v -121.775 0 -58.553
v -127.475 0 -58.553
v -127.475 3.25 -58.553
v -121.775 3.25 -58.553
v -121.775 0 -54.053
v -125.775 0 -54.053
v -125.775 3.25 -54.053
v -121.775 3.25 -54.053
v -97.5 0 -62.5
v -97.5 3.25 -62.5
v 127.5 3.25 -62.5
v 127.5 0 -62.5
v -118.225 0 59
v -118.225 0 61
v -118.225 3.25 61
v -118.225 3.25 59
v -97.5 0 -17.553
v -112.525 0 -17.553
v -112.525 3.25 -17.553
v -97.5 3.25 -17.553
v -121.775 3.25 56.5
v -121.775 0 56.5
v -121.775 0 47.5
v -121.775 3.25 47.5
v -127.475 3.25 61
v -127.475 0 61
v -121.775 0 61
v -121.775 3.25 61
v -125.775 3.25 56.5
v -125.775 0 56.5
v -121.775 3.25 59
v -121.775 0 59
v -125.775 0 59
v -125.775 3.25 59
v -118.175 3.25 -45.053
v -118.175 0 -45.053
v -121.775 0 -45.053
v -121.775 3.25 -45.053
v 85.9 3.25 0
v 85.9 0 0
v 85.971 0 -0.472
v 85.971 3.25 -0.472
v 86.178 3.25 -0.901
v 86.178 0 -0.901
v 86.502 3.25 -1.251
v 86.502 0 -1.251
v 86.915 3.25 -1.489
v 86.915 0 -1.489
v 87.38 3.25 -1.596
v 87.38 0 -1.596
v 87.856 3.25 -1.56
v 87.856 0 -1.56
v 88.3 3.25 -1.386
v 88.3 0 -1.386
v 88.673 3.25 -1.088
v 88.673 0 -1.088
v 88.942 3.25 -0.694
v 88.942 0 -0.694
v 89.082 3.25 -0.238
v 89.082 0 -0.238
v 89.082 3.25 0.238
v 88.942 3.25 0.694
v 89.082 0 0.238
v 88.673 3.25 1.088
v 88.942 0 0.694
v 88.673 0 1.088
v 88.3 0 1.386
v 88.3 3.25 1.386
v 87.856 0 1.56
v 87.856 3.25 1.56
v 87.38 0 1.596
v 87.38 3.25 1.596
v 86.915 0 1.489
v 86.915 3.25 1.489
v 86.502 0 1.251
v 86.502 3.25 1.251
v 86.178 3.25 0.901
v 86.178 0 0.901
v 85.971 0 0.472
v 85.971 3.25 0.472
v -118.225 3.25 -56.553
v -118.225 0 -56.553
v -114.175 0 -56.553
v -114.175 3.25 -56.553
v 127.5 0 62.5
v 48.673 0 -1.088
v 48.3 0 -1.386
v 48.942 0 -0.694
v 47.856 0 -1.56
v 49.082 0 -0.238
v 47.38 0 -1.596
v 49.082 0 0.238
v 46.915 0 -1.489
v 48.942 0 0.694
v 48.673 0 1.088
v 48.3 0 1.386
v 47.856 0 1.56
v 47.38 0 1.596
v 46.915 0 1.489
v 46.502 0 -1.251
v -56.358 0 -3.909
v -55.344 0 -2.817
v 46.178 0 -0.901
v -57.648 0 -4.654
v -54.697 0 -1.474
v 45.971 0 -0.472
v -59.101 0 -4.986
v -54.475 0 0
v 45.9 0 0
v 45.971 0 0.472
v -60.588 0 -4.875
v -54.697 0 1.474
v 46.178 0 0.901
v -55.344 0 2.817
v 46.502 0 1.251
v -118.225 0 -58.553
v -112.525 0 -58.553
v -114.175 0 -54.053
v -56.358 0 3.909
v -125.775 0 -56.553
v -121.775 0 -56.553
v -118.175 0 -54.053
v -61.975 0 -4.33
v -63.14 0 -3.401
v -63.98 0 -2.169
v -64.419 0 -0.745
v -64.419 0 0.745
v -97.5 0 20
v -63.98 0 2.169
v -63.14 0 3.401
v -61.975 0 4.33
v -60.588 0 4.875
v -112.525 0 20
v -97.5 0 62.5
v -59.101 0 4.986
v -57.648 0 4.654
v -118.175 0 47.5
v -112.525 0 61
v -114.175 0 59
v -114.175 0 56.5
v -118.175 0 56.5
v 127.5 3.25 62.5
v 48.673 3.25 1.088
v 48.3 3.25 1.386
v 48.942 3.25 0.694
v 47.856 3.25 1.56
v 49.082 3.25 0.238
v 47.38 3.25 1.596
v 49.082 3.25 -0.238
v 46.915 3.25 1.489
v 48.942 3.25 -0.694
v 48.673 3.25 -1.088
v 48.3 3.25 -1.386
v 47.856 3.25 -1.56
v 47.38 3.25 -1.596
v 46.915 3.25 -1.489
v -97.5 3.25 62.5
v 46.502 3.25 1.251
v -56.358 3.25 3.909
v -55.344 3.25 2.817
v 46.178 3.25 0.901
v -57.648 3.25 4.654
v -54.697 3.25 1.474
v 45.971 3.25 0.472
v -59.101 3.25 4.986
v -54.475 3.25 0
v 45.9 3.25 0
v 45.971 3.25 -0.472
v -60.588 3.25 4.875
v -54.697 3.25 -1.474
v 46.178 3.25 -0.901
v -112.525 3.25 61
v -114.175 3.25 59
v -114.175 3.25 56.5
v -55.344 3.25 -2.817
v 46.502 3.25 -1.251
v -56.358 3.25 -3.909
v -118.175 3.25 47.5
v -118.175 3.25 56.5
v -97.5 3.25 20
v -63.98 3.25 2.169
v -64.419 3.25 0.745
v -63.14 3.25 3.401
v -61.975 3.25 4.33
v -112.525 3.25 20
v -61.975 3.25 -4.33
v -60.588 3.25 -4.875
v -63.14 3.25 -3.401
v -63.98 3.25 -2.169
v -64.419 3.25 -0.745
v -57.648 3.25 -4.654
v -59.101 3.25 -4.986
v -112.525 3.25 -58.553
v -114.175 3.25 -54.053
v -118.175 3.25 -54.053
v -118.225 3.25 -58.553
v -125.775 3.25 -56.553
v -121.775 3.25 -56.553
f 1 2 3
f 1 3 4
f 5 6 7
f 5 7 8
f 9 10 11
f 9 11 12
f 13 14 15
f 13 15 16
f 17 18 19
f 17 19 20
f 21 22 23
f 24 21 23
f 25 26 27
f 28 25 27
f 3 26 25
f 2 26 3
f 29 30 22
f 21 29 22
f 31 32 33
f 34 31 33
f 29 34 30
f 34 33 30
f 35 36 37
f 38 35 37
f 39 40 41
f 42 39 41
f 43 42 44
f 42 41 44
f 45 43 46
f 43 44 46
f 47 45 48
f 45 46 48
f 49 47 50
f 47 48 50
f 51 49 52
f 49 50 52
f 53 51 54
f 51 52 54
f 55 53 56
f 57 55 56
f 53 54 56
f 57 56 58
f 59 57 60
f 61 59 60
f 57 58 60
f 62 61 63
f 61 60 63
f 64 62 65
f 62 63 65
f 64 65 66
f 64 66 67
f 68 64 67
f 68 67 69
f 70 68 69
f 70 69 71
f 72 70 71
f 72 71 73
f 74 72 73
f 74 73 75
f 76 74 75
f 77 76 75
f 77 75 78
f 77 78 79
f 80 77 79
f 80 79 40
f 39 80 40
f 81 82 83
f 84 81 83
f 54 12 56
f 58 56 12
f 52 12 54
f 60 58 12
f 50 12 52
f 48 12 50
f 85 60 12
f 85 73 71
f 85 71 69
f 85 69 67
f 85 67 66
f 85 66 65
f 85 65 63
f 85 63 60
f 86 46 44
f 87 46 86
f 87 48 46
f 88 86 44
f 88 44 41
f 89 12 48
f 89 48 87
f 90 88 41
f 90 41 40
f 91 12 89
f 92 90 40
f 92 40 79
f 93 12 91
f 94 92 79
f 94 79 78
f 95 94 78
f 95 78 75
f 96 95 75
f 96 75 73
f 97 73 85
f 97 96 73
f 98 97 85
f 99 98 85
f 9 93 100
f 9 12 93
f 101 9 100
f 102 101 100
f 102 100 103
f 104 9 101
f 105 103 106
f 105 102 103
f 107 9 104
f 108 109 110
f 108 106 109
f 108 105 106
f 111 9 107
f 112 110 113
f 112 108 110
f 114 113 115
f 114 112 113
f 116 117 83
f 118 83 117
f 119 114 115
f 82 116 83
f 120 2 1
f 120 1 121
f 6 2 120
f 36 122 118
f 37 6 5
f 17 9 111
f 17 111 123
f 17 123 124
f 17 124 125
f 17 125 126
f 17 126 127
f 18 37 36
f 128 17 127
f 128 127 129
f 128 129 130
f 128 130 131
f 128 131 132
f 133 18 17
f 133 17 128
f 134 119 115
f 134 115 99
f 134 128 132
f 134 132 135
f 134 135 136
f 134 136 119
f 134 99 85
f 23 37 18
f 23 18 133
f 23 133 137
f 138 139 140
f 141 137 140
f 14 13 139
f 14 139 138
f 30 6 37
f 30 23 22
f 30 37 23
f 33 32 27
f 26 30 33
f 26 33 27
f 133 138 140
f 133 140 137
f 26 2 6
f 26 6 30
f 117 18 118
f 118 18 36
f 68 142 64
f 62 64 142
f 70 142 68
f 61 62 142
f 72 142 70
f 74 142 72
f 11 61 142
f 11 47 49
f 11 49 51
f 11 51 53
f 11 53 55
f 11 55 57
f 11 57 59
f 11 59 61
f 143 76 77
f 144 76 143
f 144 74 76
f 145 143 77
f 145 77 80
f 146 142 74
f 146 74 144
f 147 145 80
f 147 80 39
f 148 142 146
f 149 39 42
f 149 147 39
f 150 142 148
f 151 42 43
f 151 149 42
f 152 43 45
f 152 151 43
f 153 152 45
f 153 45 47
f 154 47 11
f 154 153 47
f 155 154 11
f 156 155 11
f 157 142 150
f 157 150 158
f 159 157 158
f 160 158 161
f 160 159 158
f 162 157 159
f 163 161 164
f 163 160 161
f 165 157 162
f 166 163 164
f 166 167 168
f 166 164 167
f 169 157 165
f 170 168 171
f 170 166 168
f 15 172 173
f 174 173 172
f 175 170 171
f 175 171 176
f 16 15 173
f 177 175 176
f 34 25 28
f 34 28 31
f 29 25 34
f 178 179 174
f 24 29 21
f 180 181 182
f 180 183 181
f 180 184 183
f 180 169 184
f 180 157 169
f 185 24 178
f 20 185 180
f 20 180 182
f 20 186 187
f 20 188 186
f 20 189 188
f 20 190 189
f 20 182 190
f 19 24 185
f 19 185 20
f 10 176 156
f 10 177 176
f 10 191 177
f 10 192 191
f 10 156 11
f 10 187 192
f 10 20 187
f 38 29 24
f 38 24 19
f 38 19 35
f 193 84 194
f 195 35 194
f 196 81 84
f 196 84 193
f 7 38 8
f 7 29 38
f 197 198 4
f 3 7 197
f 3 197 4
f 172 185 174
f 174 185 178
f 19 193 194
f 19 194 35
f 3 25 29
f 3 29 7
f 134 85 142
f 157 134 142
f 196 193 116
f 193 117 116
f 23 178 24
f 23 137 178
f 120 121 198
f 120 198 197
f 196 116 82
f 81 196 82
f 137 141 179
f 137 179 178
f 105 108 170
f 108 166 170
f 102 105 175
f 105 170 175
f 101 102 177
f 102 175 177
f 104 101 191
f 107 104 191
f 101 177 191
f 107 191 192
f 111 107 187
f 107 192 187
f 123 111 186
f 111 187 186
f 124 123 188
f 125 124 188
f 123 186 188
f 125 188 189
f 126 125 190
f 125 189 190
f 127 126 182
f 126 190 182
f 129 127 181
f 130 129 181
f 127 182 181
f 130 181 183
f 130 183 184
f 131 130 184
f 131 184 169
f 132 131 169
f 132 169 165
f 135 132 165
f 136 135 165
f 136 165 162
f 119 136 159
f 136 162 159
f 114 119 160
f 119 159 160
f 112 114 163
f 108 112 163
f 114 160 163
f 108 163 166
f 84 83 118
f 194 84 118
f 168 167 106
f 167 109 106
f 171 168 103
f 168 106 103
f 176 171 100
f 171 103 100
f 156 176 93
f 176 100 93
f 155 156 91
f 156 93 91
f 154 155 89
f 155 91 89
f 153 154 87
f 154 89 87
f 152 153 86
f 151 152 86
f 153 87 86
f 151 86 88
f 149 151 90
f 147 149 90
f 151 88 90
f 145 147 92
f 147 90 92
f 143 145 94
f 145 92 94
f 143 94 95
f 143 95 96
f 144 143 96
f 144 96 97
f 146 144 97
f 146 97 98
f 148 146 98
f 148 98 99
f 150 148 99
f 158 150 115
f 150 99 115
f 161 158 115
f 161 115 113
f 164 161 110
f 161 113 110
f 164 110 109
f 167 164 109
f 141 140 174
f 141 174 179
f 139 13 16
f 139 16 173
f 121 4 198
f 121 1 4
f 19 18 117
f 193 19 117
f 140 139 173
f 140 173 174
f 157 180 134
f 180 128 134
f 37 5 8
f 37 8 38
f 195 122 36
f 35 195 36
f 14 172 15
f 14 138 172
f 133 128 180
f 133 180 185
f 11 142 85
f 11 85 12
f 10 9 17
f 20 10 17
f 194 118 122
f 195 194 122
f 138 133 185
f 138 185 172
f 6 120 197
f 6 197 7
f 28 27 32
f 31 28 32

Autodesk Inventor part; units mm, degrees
ref_plane "YZ Plane" through (0, 0, 0) normal (1, 0, 0) x (0, 1, 0)
ref_plane "XZ Plane" through (0, 0, 0) normal (0, 1, 0) x (-1, 0, 0)
ref_plane "XY Plane" through (0, 0, 0) normal (0, 0, 1) x (1, 0, 0)
sketch "Sketch1" plane through (0, 0, 0) normal (0, 1, 0) x (-1, 0, 0)
  line L0 (-97.5, -62.5) -> (97.5, -62.5)
  line L1 (97.5, 62.5) -> (-97.5, 62.5)
  line L2 (-97.5, 62.5) -> (-97.5, -62.5)
  line L3 (-97.5, -62.5) -> (97.5, 62.5) construction
  line L4 (97.5, -62.5) -> (-97.5, 62.5) construction
  line L5 (97.5, 20) -> (112.525, 20)
  line L6 (127.475, 21.2237) -> (127.475, -18.7763)
  line L7 (112.525, -17.5526) -> (97.5, -17.5526)
  line L8 (97.5, -62.5) -> (97.5, -17.5526)
  line L9 (97.5, 20) -> (97.5, 62.5)
  line L10 (112.525, 20) -> (112.525, 61)
  line L11 (127.475, 61) -> (127.475, 21.2237)
  line L12 (127.475, 1.2237) -> (97.475, 1.2237) construction
  line L13 (112.525, -17.5526) -> (112.525, -58.5526)
  line L14 (127.475, -58.5526) -> (127.475, -18.7763)
  line L15 (119.975, 61) -> (121.775, 61) construction
  line L16 (121.775, 61) -> (121.775, 59)
  line L17 (118.225, 61) -> (118.225, 59)
  line L18 (121.775, 59) -> (125.775, 59)
  line L19 (125.775, 59) -> (125.775, 56.5)
  line L20 (125.775, 56.5) -> (121.775, 56.5)
  line L21 (121.775, 61) -> (121.775, 53) construction
  line L22 (119.975, 61) -> (119.975, 52.3078) construction
  line L23 (118.225, 59) -> (114.175, 59)
  line L24 (114.175, 59) -> (114.175, 56.5)
  line L25 (114.175, 56.5) -> (118.175, 56.5)
  line L26 (118.175, 56.5) -> (118.175, 53.5)
  line L27 (112.525, 61) -> (118.225, 61)
  line L28 (127.475, 61) -> (121.775, 61)
  line L29 (119.975, -58.5526) -> (121.775, -58.5526) construction
  line L30 (112.525, -58.5526) -> (118.225, -58.5526)
  line L31 (127.475, -58.5526) -> (121.775, -58.5526)
  line L32 (121.775, 56.5) -> (121.775, 47.5)
  line L33 (118.175, 53.5) -> (118.175, 47.5)
  line L34 (118.175, 47.5) -> (121.775, 47.5)
  line L35 (119.975, -58.5526) -> (121.775, -58.5526) construction
  line L36 (121.775, -58.5526) -> (121.775, -56.5526)
  line L37 (118.225, -58.5526) -> (118.225, -56.5526)
  line L38 (121.775, -56.5526) -> (125.775, -56.5526)
  line L39 (125.775, -56.5526) -> (125.775, -54.0526)
  line L40 (125.775, -54.0526) -> (121.775, -54.0526)
  line L41 (121.775, -58.5526) -> (121.775, -50.5526) construction
  line L42 (119.975, -58.5526) -> (119.975, -49.8604) construction
  line L43 (114.175, -54.0526) -> (118.175, -54.0526)
  line L44 (114.175, -56.5526) -> (114.175, -54.0526)
  line L45 (118.225, -56.5526) -> (114.175, -56.5526)
  line L46 (118.175, -54.0526) -> (118.175, -51.0526)
  line L47 (112.525, -58.5526) -> (118.225, -58.5526)
  line L48 (127.475, -58.5526) -> (121.775, -58.5526)
  line L49 (121.775, -54.0526) -> (121.775, -45.0526)
  line L50 (118.175, -51.0526) -> (118.175, -45.0526)
  line L51 (118.175, -45.0526) -> (121.775, -45.0526)
  line L52 (127.475, 61) -> (127.475, 79) construction
  line L53 (-97.5, 0) -> (-67.5, 0) construction
  line L54 (-67.5, 62.5) -> (-67.5, -62.5) construction
  line L55 (127.475, 79) -> (-67.5, 0) construction
  line L56 (127.475, -58.5526) -> (127.475, -76.5526) construction
  line L57 (127.475, -76.5526) -> (-67.5, 0) construction
  line L58 (-97.5, 62.5) -> (-117.5, 62.5)
  line L59 (-117.5, 62.5) -> (-117.5, -62.5)
  line L60 (-117.5, -62.5) -> (-97.5, -62.5)
  line L61 (-97.5, -62.5) -> (-97.5, 62.5)
  line L62 (-67.5, 0) -> (-47.5, 0) construction
  circle A0 centre (-47.5, 0) radius 1.6
  line L63 (-67.5, 0) -> (-87.5, 0) construction
  circle A1 centre (-87.5, 0) radius 1.6
  point P0 (0, 0)
  point P1 (121.775, 53.5)
  point P2 (121.775, -51.0526)
  point P3 (-97.5, -62.5)
  dimension "d0" = 195
  dimension "d1" = 125
  dimension "d3" = 30
  dimension "d4" = 40
  dimension "d5" = 15
  dimension "d6" = 41
  dimension "d11" = 7.5
  dimension "d12" = 1.8
  dimension "d13" = 1.75
  dimension "d14" = 2
  dimension "d15" = 2
  dimension "d17" = 2.5
  dimension "d18" = 8
  dimension "d19" = 3
  dimension "d21" = 30
  dimension "d22" = 8.6922
  dimension "d23" = 1.5
  dimension "d25" = 4
  dimension "d26" = 13.25
  dimension "d27" = 9
  dimension "d28" = 18
  dimension "d29" = 30
  dimension "d30" = 18
  dimension "d35" = 20
  dimension "d36" = 125
  dimension "d41" = 20
  dimension "d42" = 3.2
  dimension "d43" = 20
  dimension "d47" = 3.2
extrude "Extrusion1" add sketch "Sketch1" along normal blind 3.25 contours L2 L1 L9 L5 L10 L27 L17 L23 L24 L25 L26 L33 L34 L32 L20 L19 L18 L16 L28 L11 L6 L14 L31 L36 L38 L39 L40 L49 L51 L50 L46 L43 L44 L45 L37 L30 L13 L7 L8 L0 | A0 | A1
sketch "Sketch2" plane through (0, 3.25, 0) normal (0, 1, 0) x (1, 0, 0)
  line L0 (-127.475, 58.5526) -> (-127.475, -61) construction
  line L1 (-127.475, 0) -> (-59.475, 0) construction
  circle A0 centre (-59.475, 0) radius 5
  point P0 (0, 0)
  dimension "d31" = 68
  dimension "d32" = 10
extrude "Extrusion2" cut sketch "Sketch2" against normal blind 10
sketch "Sketch3" plane through (97.5, 0, 62.5) normal (1, 0, 0) x (0, 0, -1)
  line L0 (125, 0) -> (80.0526, 0) projected
  line L1 (0, 3.25) -> (125, 3.25)
  line L2 (125, 3.25) -> (125, 0)
  line L3 (125, 0) -> (0, 0)
  line L4 (0, 0) -> (0, 3.25)
  point P0 (62.5, 0)
extrude "Extrusion4" add sketch "Sketch3" along normal blind 30
extrude "Extrusion5" cut sketch "Sketch1" along normal blind 4 contours A0 | A1
properties part number "suelo_imp"
